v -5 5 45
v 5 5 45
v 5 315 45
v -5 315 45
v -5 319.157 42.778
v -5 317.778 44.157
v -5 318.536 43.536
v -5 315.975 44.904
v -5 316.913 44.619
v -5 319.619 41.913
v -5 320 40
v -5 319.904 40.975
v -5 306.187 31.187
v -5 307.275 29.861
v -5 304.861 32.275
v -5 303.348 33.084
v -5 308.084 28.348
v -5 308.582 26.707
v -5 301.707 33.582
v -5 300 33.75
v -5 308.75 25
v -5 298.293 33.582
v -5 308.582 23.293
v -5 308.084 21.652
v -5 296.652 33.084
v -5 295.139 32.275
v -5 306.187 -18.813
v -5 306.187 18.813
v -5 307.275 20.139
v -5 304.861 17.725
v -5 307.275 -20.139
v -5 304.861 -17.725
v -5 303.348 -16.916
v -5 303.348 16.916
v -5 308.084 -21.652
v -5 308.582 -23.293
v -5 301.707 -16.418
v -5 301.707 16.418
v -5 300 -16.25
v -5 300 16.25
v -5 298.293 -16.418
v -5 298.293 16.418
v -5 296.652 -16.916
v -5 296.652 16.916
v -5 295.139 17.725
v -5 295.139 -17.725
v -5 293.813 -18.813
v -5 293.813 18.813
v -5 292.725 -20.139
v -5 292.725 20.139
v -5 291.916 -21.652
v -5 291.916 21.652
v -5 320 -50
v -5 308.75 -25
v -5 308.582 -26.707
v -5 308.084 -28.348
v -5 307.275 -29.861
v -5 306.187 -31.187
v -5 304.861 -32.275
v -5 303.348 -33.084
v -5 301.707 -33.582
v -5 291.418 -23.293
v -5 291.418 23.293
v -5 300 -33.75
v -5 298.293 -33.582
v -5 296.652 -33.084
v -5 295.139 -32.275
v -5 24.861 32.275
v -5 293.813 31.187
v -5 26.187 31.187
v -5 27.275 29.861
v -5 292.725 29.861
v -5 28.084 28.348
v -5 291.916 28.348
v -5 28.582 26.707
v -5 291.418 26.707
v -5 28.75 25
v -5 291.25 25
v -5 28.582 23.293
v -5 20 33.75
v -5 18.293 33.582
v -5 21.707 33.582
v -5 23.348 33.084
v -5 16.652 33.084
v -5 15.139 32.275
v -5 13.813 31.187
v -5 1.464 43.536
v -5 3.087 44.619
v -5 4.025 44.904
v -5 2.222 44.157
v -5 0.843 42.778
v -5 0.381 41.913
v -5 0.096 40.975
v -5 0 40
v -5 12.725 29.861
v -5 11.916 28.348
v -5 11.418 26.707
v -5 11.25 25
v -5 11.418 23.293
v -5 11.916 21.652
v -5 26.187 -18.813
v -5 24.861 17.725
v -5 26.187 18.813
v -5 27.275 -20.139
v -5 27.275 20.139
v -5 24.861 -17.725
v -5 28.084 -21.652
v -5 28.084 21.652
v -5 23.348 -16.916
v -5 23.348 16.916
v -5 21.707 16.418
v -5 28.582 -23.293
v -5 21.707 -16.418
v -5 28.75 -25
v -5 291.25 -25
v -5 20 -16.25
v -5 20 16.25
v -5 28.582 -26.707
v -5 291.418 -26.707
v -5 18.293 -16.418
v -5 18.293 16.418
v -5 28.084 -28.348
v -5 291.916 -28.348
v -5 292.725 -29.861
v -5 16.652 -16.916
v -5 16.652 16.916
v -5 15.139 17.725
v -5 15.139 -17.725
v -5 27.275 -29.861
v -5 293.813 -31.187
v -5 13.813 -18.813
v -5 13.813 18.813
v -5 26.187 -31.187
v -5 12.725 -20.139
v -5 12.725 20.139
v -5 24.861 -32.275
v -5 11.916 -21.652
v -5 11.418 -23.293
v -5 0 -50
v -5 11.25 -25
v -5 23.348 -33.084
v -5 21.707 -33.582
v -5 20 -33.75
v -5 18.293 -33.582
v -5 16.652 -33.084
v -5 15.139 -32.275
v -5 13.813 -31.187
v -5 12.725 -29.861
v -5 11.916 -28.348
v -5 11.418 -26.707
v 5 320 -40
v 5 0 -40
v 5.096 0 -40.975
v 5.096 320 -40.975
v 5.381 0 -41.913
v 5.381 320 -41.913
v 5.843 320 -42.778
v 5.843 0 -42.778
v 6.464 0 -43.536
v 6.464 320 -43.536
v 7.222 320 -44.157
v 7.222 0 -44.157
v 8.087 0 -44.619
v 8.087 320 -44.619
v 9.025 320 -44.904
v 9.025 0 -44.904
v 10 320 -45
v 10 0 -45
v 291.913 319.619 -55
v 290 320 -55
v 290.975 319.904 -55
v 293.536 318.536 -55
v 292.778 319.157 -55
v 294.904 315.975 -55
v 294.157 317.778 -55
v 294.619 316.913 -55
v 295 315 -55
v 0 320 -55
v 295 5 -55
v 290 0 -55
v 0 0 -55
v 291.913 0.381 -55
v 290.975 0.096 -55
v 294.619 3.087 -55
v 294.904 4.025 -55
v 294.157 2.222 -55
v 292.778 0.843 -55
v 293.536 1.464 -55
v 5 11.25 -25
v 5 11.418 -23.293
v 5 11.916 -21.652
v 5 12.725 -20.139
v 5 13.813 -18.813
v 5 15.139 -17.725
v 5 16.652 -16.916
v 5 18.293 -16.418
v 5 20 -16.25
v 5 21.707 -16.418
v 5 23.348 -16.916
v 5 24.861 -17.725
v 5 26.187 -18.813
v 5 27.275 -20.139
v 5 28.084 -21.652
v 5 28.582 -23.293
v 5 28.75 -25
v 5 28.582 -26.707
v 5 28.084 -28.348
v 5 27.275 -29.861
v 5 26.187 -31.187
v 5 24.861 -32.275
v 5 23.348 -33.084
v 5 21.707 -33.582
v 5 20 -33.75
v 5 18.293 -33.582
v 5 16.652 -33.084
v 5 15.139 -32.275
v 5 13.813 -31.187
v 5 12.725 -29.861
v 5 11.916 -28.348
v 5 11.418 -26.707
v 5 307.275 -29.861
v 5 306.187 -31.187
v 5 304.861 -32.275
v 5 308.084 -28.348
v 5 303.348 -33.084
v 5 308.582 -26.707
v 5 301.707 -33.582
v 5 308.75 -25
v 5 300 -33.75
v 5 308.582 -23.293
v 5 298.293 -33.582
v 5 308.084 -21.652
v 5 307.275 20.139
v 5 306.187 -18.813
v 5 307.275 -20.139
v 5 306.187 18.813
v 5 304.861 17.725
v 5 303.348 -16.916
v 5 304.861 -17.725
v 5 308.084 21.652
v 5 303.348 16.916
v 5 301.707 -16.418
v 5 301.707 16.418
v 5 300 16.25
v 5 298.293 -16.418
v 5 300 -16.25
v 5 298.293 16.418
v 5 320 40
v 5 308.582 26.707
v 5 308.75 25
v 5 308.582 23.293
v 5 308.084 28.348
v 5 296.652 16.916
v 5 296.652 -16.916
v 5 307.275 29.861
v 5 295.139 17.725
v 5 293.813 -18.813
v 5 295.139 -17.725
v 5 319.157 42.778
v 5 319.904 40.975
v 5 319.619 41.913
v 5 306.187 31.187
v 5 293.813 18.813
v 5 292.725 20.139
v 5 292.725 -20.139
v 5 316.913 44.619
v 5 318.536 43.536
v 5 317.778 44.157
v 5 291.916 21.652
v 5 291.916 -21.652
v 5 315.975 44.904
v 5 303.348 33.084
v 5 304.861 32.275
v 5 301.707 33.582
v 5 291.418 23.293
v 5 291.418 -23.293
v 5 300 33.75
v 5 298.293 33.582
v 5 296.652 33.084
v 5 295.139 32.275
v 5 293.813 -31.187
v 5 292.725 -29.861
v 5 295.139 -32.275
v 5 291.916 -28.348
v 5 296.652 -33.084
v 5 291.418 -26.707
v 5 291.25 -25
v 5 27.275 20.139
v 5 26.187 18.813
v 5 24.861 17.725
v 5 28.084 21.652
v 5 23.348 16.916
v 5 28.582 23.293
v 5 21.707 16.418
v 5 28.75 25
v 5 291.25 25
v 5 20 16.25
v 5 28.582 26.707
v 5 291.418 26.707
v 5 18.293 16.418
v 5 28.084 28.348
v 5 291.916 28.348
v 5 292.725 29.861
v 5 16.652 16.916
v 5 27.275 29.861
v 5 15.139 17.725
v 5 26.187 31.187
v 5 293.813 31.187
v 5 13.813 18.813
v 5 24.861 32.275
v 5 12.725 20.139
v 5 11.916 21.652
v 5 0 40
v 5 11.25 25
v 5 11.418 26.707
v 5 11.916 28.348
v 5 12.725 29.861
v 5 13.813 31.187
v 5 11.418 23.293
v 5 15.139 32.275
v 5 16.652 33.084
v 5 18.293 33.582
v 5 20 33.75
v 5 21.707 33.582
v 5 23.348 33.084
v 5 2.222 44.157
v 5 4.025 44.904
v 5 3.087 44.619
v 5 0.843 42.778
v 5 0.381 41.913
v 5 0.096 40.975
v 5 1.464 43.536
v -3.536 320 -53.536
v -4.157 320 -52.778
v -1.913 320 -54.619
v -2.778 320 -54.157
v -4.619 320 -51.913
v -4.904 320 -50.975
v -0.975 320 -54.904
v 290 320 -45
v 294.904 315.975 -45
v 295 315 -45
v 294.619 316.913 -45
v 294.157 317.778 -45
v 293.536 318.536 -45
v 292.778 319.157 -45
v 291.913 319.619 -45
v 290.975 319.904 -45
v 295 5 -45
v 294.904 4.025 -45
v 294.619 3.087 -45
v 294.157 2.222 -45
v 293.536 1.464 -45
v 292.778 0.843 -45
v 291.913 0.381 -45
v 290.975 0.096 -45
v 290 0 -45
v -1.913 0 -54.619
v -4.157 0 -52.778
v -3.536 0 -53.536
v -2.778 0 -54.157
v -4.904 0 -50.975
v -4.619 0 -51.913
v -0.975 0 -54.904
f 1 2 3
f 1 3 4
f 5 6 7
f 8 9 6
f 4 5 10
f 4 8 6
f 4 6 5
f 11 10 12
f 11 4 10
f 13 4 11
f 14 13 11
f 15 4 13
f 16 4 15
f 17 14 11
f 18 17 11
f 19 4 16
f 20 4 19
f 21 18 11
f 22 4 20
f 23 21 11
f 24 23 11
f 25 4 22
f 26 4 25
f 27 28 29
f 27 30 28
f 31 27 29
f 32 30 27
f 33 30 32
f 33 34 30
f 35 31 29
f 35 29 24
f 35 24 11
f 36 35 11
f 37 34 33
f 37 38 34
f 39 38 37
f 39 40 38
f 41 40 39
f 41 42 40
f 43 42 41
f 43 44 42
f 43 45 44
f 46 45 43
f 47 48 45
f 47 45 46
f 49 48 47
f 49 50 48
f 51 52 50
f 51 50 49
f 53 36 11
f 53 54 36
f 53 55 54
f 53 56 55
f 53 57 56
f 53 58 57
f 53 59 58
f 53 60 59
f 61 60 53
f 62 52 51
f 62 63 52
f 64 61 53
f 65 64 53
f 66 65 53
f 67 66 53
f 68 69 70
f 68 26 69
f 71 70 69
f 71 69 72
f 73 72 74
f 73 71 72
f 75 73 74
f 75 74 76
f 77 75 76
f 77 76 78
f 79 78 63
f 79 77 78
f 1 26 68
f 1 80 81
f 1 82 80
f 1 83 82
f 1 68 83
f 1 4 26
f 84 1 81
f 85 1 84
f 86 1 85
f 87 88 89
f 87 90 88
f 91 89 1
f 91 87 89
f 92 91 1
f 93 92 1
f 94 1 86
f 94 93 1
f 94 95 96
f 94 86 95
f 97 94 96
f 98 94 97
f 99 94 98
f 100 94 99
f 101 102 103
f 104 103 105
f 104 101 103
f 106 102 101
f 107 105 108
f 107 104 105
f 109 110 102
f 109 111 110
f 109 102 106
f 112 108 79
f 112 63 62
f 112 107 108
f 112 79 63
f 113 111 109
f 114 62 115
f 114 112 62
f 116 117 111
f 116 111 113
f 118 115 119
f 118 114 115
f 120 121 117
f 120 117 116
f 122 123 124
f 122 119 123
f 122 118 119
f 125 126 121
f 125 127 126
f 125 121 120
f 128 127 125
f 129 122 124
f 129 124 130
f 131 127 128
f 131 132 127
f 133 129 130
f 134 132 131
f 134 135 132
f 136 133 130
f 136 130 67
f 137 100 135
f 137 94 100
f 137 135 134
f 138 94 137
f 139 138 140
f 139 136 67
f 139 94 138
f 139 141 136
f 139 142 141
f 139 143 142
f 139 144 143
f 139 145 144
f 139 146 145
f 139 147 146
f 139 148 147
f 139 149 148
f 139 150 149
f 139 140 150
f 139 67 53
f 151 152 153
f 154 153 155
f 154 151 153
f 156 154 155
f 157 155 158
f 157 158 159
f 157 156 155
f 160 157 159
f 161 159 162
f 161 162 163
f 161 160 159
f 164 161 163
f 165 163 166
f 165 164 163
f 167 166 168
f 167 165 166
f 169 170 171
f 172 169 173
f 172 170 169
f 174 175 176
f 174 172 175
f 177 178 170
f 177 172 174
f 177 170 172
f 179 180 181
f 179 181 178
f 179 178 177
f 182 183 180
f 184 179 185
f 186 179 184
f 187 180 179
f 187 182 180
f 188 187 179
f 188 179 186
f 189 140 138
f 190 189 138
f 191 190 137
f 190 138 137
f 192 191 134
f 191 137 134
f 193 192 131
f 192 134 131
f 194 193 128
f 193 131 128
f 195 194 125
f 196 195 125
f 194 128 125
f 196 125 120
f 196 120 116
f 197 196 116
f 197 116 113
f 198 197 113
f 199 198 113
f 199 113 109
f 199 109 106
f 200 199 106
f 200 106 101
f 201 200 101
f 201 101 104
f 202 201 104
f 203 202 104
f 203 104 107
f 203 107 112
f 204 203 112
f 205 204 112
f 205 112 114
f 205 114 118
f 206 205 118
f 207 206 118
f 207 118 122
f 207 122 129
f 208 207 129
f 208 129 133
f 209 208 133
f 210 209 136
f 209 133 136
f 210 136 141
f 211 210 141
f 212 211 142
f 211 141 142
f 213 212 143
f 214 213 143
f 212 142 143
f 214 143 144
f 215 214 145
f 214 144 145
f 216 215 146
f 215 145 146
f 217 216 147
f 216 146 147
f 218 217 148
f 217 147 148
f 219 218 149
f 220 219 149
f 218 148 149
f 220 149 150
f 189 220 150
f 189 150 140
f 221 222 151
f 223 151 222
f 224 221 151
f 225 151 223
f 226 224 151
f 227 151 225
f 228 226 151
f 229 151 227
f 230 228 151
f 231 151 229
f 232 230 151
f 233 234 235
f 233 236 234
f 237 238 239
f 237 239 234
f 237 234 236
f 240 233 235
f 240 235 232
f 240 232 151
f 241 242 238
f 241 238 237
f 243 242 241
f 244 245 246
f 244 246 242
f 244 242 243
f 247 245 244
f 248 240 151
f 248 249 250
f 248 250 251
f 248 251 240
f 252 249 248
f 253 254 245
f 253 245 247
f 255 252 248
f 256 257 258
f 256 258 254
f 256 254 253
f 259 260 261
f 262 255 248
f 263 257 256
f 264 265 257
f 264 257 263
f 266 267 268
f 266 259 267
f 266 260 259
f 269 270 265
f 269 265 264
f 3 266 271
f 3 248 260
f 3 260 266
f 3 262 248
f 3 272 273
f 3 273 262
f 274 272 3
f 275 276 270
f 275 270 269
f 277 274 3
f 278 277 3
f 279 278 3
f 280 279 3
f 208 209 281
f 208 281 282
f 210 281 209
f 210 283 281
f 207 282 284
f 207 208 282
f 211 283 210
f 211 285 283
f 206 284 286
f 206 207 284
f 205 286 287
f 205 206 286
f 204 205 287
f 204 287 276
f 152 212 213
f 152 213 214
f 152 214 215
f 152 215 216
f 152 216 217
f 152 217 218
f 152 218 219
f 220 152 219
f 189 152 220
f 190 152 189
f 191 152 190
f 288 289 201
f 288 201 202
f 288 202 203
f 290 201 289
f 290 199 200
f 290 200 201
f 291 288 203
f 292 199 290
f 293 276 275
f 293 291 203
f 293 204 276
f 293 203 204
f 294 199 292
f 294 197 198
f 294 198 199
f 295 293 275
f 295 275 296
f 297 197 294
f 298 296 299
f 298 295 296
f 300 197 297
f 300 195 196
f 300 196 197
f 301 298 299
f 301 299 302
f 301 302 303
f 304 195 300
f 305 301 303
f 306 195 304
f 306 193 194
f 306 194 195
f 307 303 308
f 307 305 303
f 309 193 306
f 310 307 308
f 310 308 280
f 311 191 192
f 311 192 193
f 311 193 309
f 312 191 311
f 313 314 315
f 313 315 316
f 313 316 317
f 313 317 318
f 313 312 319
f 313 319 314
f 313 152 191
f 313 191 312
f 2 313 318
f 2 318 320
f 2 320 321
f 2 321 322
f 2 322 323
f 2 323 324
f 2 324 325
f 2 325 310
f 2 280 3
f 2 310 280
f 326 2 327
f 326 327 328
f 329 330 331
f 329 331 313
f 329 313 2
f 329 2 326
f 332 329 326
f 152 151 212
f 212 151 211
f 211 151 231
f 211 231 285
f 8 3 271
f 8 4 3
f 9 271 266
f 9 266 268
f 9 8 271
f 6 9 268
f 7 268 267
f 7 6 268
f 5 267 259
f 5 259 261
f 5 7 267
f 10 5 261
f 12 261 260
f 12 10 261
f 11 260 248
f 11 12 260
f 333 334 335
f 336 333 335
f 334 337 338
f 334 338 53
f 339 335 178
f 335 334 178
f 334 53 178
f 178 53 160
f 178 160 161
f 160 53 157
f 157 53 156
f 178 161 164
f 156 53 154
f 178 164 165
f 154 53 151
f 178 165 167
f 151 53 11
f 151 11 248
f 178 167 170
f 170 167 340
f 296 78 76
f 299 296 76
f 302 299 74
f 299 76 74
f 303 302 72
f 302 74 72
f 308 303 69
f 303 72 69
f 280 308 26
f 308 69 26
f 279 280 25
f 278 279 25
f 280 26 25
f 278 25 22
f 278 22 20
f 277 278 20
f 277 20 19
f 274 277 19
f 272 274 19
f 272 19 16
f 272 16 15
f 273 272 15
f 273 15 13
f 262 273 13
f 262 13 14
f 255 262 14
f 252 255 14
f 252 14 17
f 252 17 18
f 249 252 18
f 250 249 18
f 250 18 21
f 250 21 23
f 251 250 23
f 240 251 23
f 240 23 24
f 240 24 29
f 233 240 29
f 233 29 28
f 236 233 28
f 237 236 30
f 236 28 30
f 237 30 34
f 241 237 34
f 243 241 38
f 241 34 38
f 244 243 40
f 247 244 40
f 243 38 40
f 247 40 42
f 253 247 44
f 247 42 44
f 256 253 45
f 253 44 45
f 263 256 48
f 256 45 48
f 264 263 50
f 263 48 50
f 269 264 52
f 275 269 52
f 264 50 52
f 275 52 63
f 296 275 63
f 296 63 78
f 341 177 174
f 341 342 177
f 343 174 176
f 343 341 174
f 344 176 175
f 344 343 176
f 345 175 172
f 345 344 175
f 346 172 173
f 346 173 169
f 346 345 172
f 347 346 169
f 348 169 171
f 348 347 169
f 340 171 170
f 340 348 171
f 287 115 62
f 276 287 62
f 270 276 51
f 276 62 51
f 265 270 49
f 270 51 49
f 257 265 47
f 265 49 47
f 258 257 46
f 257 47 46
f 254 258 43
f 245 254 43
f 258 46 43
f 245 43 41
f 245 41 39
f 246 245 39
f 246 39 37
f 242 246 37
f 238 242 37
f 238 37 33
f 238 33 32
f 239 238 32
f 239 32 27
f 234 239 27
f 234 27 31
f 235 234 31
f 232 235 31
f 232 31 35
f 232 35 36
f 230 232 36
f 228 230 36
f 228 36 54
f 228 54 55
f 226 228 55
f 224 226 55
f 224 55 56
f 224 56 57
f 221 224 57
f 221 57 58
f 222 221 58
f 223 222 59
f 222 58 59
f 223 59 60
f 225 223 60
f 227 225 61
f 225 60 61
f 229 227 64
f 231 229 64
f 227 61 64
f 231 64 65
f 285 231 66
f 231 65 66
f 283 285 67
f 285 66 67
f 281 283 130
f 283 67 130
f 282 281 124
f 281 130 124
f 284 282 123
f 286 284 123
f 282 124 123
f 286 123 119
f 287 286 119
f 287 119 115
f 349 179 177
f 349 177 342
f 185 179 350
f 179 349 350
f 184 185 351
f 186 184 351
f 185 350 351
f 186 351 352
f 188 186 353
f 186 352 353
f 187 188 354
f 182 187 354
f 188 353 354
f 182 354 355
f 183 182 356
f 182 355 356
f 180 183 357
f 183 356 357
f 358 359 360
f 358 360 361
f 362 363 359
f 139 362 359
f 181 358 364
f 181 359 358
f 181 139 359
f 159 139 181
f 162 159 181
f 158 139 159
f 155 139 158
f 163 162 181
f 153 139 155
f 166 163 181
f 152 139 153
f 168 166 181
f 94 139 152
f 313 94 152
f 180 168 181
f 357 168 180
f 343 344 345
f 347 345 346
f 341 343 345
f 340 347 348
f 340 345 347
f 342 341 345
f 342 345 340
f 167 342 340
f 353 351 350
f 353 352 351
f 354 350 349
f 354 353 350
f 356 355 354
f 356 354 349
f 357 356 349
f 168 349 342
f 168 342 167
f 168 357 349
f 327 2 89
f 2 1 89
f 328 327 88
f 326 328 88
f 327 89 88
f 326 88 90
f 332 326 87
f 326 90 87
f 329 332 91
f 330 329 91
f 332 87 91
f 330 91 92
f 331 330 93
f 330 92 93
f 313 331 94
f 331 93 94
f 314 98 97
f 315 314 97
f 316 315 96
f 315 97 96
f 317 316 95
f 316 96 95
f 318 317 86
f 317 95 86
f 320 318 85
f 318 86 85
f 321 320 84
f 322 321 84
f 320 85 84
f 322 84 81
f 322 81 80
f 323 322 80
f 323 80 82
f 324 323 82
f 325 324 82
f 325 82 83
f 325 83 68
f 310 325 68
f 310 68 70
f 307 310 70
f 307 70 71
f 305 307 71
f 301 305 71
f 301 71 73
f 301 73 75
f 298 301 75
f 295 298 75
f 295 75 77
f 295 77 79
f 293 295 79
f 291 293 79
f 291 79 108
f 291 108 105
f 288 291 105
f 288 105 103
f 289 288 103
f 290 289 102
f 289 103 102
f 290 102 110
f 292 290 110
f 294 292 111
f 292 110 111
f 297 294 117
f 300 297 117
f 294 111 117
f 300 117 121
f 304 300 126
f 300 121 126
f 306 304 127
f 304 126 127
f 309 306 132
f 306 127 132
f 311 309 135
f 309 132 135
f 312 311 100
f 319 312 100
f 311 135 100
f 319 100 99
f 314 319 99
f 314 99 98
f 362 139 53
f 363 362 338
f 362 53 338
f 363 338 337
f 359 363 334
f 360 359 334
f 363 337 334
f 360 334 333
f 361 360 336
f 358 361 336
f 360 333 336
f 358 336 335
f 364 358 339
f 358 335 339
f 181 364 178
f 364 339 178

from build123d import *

# Parameters (mm, degrees)
F1_DEPTH = 320
F2_R     = 5
F4_D     = 17.5
F4_DEPTH = 20
F4_TIP   = 5.2575304165
F5_R     = 5
F6_R     = 5


with BuildPart() as f1:
    # F0 (on Front) → F1 (new body)
    with BuildSketch(Plane.XZ):
        Polygon((5, -45), (5, 45), (-5, 45), (-5, -45), (-5, -55), (295, -55), (295, -45), align=None)
    extrude(amount=-F1_DEPTH)

    # F2
    f2_edges = [f1.edges().sort_by_distance(p)[0] for p in [
        (0, 0, 45),
        (0, 320, 45),
        (295, 320, -50),
        (295, 0, -50),
    ]]
    fillet(f2_edges, radius=F2_R)

    # F4
    with Locations(Plane.YZ.offset(5)):
        with Locations((20, -25), (20, 25), (300, 25), (300, -25)):
            Hole(F4_D / 2, depth=F4_DEPTH)
            with Locations((0, 0, -(F4_DEPTH + F4_TIP / 2))):  # 118° drill point
                Cone(0, F4_D / 2, F4_TIP, mode=Mode.SUBTRACT)

    # F5
    f5_edges = [f1.edges().sort_by_distance(p)[0] for p in [
        (-5, 160, -55),
    ]]
    fillet(f5_edges, radius=F5_R)

    # F6
    f6_edges = [f1.edges().sort_by_distance(p)[0] for p in [
        (5, 160, -45),
    ]]
    fillet(f6_edges, radius=F6_R)


solid = f1.part
